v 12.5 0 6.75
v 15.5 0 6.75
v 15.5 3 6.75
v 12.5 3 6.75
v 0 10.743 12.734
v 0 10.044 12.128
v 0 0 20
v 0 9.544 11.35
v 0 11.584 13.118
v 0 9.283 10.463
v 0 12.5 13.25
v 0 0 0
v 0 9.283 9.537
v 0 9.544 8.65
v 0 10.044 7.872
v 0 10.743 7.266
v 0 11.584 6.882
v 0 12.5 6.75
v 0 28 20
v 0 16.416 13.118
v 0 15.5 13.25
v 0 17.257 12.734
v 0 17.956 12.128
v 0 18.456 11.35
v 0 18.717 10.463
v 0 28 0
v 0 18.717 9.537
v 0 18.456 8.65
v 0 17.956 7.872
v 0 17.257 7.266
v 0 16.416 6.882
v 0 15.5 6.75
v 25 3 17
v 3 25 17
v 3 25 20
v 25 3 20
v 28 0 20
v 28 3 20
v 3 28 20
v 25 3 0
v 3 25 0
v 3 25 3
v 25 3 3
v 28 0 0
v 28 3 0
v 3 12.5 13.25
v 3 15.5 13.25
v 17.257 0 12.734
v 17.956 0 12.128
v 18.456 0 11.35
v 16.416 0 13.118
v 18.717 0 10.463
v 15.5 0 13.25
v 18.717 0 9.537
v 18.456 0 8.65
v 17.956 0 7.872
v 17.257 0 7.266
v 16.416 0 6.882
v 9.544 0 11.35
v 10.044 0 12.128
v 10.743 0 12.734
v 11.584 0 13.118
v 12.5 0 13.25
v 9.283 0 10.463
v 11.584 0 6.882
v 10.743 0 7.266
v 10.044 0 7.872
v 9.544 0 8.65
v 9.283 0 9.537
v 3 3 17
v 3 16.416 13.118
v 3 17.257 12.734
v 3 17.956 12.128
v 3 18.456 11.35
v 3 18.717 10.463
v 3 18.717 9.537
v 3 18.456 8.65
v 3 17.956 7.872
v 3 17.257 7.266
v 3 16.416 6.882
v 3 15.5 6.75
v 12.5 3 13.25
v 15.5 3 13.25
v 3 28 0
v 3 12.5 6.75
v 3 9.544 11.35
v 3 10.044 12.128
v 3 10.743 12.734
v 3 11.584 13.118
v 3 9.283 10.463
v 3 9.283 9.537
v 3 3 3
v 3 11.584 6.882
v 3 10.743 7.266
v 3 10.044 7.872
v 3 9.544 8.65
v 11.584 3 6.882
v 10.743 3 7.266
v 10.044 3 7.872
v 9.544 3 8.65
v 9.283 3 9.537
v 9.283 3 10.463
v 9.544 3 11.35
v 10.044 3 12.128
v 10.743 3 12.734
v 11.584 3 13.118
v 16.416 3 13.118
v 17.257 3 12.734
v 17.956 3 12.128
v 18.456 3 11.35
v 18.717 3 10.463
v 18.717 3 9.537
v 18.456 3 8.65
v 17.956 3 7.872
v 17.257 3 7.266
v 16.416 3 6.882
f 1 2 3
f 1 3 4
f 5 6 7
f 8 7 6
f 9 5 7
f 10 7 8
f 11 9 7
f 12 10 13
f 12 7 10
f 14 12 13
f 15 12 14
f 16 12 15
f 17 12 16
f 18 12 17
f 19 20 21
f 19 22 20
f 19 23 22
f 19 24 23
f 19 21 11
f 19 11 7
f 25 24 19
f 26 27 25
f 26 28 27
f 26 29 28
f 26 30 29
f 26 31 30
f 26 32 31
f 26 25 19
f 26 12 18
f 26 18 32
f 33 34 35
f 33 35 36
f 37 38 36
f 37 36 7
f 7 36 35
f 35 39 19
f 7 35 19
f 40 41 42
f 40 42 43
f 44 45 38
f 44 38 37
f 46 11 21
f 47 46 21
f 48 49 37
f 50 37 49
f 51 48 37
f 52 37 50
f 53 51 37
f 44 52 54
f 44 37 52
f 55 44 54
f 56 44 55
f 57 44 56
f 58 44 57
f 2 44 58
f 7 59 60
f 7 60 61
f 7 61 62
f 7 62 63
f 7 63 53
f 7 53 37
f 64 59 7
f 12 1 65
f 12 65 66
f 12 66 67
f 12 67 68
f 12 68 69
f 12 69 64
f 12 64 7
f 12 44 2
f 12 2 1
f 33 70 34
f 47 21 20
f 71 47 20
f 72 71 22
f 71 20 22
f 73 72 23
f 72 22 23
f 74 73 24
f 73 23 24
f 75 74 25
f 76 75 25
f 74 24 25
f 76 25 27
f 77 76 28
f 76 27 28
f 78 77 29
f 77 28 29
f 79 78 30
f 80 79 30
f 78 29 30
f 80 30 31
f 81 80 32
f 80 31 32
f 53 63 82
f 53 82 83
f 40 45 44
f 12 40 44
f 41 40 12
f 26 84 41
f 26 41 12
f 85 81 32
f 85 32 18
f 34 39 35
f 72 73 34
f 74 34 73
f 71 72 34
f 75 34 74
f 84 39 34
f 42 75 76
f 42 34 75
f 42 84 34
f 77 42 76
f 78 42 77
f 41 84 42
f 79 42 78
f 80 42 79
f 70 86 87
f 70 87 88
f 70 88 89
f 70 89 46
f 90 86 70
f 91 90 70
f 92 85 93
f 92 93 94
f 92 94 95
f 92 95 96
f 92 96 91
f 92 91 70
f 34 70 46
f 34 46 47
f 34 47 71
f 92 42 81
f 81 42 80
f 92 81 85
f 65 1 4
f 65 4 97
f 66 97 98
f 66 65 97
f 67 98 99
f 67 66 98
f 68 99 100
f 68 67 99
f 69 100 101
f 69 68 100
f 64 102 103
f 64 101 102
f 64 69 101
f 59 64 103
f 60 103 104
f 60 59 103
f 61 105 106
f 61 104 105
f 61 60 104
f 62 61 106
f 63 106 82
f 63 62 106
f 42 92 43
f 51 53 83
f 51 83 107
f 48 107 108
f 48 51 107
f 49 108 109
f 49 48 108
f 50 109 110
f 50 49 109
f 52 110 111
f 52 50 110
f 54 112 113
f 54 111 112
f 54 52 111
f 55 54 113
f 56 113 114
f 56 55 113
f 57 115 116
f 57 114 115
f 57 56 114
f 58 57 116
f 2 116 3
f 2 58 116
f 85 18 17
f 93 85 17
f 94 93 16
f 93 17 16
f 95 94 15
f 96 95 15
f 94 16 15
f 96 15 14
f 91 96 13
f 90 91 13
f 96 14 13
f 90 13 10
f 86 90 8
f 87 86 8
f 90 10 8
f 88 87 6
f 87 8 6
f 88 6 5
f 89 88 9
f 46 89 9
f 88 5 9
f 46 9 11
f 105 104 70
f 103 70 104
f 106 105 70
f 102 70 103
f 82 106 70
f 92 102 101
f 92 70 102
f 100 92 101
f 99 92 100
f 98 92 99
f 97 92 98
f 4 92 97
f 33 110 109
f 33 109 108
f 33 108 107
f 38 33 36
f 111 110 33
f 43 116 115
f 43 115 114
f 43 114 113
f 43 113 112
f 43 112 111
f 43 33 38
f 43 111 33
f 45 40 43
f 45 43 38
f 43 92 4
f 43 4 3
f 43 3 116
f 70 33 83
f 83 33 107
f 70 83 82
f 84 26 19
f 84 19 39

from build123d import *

# Parameters (mm, degrees)
BOSS_EXTRUDE1_DEPTH = 20
SKETCH2_W           = 22
SKETCH2_H           = 14
CUT_EXTRUDE1_DEPTH  = 43.532340636
CUT_EXTRUDE2_DEPTH  = 45.362146026


with BuildPart() as part:
    # Sketch1 → Boss-Extrude1 (new body)
    with BuildSketch(Plane.XY):
        Polygon((0, 0), (0, 28), (3, 28), (3, 25), (25, 3), (28, 3), (28, 0), align=None)
    extrude(amount=BOSS_EXTRUDE1_DEPTH)

    # Sketch2 → Cut-Extrude1 (cut, through all)
    with BuildSketch(Plane(origin=(0, 3, 0), x_dir=(1, 0, 0), z_dir=(0, 1, 0))):
        with Locations((14, -10)):
            Rectangle(SKETCH2_W, SKETCH2_H)
    extrude(amount=CUT_EXTRUDE1_DEPTH, mode=Mode.SUBTRACT)

    # Sketch3 → Cut-Extrude2 (cut, through all)
    with BuildSketch(Plane.XZ):
        with BuildLine():
            Line((15.5, 6.75), (12.5, 6.75))
            ThreePointArc((12.5, 6.75), (9.25, 10), (12.5, 13.25))
            Line((12.5, 13.25), (15.5, 13.25))
            ThreePointArc((15.5, 13.25), (18.75, 10), (15.5, 6.75))
        make_face()
    cut_extrude2 = extrude(amount=-CUT_EXTRUDE2_DEPTH, mode=Mode.SUBTRACT)

    # Mirror1: Cut-Extrude2 across plane
    add(cut_extrude2.mirror(Plane(origin=(0, 0, 0), x_dir=(0, 0, 1), z_dir=(-0.7071067811865487, 0.7071067811865464, 0))), mode=Mode.SUBTRACT)


solid = part.part
